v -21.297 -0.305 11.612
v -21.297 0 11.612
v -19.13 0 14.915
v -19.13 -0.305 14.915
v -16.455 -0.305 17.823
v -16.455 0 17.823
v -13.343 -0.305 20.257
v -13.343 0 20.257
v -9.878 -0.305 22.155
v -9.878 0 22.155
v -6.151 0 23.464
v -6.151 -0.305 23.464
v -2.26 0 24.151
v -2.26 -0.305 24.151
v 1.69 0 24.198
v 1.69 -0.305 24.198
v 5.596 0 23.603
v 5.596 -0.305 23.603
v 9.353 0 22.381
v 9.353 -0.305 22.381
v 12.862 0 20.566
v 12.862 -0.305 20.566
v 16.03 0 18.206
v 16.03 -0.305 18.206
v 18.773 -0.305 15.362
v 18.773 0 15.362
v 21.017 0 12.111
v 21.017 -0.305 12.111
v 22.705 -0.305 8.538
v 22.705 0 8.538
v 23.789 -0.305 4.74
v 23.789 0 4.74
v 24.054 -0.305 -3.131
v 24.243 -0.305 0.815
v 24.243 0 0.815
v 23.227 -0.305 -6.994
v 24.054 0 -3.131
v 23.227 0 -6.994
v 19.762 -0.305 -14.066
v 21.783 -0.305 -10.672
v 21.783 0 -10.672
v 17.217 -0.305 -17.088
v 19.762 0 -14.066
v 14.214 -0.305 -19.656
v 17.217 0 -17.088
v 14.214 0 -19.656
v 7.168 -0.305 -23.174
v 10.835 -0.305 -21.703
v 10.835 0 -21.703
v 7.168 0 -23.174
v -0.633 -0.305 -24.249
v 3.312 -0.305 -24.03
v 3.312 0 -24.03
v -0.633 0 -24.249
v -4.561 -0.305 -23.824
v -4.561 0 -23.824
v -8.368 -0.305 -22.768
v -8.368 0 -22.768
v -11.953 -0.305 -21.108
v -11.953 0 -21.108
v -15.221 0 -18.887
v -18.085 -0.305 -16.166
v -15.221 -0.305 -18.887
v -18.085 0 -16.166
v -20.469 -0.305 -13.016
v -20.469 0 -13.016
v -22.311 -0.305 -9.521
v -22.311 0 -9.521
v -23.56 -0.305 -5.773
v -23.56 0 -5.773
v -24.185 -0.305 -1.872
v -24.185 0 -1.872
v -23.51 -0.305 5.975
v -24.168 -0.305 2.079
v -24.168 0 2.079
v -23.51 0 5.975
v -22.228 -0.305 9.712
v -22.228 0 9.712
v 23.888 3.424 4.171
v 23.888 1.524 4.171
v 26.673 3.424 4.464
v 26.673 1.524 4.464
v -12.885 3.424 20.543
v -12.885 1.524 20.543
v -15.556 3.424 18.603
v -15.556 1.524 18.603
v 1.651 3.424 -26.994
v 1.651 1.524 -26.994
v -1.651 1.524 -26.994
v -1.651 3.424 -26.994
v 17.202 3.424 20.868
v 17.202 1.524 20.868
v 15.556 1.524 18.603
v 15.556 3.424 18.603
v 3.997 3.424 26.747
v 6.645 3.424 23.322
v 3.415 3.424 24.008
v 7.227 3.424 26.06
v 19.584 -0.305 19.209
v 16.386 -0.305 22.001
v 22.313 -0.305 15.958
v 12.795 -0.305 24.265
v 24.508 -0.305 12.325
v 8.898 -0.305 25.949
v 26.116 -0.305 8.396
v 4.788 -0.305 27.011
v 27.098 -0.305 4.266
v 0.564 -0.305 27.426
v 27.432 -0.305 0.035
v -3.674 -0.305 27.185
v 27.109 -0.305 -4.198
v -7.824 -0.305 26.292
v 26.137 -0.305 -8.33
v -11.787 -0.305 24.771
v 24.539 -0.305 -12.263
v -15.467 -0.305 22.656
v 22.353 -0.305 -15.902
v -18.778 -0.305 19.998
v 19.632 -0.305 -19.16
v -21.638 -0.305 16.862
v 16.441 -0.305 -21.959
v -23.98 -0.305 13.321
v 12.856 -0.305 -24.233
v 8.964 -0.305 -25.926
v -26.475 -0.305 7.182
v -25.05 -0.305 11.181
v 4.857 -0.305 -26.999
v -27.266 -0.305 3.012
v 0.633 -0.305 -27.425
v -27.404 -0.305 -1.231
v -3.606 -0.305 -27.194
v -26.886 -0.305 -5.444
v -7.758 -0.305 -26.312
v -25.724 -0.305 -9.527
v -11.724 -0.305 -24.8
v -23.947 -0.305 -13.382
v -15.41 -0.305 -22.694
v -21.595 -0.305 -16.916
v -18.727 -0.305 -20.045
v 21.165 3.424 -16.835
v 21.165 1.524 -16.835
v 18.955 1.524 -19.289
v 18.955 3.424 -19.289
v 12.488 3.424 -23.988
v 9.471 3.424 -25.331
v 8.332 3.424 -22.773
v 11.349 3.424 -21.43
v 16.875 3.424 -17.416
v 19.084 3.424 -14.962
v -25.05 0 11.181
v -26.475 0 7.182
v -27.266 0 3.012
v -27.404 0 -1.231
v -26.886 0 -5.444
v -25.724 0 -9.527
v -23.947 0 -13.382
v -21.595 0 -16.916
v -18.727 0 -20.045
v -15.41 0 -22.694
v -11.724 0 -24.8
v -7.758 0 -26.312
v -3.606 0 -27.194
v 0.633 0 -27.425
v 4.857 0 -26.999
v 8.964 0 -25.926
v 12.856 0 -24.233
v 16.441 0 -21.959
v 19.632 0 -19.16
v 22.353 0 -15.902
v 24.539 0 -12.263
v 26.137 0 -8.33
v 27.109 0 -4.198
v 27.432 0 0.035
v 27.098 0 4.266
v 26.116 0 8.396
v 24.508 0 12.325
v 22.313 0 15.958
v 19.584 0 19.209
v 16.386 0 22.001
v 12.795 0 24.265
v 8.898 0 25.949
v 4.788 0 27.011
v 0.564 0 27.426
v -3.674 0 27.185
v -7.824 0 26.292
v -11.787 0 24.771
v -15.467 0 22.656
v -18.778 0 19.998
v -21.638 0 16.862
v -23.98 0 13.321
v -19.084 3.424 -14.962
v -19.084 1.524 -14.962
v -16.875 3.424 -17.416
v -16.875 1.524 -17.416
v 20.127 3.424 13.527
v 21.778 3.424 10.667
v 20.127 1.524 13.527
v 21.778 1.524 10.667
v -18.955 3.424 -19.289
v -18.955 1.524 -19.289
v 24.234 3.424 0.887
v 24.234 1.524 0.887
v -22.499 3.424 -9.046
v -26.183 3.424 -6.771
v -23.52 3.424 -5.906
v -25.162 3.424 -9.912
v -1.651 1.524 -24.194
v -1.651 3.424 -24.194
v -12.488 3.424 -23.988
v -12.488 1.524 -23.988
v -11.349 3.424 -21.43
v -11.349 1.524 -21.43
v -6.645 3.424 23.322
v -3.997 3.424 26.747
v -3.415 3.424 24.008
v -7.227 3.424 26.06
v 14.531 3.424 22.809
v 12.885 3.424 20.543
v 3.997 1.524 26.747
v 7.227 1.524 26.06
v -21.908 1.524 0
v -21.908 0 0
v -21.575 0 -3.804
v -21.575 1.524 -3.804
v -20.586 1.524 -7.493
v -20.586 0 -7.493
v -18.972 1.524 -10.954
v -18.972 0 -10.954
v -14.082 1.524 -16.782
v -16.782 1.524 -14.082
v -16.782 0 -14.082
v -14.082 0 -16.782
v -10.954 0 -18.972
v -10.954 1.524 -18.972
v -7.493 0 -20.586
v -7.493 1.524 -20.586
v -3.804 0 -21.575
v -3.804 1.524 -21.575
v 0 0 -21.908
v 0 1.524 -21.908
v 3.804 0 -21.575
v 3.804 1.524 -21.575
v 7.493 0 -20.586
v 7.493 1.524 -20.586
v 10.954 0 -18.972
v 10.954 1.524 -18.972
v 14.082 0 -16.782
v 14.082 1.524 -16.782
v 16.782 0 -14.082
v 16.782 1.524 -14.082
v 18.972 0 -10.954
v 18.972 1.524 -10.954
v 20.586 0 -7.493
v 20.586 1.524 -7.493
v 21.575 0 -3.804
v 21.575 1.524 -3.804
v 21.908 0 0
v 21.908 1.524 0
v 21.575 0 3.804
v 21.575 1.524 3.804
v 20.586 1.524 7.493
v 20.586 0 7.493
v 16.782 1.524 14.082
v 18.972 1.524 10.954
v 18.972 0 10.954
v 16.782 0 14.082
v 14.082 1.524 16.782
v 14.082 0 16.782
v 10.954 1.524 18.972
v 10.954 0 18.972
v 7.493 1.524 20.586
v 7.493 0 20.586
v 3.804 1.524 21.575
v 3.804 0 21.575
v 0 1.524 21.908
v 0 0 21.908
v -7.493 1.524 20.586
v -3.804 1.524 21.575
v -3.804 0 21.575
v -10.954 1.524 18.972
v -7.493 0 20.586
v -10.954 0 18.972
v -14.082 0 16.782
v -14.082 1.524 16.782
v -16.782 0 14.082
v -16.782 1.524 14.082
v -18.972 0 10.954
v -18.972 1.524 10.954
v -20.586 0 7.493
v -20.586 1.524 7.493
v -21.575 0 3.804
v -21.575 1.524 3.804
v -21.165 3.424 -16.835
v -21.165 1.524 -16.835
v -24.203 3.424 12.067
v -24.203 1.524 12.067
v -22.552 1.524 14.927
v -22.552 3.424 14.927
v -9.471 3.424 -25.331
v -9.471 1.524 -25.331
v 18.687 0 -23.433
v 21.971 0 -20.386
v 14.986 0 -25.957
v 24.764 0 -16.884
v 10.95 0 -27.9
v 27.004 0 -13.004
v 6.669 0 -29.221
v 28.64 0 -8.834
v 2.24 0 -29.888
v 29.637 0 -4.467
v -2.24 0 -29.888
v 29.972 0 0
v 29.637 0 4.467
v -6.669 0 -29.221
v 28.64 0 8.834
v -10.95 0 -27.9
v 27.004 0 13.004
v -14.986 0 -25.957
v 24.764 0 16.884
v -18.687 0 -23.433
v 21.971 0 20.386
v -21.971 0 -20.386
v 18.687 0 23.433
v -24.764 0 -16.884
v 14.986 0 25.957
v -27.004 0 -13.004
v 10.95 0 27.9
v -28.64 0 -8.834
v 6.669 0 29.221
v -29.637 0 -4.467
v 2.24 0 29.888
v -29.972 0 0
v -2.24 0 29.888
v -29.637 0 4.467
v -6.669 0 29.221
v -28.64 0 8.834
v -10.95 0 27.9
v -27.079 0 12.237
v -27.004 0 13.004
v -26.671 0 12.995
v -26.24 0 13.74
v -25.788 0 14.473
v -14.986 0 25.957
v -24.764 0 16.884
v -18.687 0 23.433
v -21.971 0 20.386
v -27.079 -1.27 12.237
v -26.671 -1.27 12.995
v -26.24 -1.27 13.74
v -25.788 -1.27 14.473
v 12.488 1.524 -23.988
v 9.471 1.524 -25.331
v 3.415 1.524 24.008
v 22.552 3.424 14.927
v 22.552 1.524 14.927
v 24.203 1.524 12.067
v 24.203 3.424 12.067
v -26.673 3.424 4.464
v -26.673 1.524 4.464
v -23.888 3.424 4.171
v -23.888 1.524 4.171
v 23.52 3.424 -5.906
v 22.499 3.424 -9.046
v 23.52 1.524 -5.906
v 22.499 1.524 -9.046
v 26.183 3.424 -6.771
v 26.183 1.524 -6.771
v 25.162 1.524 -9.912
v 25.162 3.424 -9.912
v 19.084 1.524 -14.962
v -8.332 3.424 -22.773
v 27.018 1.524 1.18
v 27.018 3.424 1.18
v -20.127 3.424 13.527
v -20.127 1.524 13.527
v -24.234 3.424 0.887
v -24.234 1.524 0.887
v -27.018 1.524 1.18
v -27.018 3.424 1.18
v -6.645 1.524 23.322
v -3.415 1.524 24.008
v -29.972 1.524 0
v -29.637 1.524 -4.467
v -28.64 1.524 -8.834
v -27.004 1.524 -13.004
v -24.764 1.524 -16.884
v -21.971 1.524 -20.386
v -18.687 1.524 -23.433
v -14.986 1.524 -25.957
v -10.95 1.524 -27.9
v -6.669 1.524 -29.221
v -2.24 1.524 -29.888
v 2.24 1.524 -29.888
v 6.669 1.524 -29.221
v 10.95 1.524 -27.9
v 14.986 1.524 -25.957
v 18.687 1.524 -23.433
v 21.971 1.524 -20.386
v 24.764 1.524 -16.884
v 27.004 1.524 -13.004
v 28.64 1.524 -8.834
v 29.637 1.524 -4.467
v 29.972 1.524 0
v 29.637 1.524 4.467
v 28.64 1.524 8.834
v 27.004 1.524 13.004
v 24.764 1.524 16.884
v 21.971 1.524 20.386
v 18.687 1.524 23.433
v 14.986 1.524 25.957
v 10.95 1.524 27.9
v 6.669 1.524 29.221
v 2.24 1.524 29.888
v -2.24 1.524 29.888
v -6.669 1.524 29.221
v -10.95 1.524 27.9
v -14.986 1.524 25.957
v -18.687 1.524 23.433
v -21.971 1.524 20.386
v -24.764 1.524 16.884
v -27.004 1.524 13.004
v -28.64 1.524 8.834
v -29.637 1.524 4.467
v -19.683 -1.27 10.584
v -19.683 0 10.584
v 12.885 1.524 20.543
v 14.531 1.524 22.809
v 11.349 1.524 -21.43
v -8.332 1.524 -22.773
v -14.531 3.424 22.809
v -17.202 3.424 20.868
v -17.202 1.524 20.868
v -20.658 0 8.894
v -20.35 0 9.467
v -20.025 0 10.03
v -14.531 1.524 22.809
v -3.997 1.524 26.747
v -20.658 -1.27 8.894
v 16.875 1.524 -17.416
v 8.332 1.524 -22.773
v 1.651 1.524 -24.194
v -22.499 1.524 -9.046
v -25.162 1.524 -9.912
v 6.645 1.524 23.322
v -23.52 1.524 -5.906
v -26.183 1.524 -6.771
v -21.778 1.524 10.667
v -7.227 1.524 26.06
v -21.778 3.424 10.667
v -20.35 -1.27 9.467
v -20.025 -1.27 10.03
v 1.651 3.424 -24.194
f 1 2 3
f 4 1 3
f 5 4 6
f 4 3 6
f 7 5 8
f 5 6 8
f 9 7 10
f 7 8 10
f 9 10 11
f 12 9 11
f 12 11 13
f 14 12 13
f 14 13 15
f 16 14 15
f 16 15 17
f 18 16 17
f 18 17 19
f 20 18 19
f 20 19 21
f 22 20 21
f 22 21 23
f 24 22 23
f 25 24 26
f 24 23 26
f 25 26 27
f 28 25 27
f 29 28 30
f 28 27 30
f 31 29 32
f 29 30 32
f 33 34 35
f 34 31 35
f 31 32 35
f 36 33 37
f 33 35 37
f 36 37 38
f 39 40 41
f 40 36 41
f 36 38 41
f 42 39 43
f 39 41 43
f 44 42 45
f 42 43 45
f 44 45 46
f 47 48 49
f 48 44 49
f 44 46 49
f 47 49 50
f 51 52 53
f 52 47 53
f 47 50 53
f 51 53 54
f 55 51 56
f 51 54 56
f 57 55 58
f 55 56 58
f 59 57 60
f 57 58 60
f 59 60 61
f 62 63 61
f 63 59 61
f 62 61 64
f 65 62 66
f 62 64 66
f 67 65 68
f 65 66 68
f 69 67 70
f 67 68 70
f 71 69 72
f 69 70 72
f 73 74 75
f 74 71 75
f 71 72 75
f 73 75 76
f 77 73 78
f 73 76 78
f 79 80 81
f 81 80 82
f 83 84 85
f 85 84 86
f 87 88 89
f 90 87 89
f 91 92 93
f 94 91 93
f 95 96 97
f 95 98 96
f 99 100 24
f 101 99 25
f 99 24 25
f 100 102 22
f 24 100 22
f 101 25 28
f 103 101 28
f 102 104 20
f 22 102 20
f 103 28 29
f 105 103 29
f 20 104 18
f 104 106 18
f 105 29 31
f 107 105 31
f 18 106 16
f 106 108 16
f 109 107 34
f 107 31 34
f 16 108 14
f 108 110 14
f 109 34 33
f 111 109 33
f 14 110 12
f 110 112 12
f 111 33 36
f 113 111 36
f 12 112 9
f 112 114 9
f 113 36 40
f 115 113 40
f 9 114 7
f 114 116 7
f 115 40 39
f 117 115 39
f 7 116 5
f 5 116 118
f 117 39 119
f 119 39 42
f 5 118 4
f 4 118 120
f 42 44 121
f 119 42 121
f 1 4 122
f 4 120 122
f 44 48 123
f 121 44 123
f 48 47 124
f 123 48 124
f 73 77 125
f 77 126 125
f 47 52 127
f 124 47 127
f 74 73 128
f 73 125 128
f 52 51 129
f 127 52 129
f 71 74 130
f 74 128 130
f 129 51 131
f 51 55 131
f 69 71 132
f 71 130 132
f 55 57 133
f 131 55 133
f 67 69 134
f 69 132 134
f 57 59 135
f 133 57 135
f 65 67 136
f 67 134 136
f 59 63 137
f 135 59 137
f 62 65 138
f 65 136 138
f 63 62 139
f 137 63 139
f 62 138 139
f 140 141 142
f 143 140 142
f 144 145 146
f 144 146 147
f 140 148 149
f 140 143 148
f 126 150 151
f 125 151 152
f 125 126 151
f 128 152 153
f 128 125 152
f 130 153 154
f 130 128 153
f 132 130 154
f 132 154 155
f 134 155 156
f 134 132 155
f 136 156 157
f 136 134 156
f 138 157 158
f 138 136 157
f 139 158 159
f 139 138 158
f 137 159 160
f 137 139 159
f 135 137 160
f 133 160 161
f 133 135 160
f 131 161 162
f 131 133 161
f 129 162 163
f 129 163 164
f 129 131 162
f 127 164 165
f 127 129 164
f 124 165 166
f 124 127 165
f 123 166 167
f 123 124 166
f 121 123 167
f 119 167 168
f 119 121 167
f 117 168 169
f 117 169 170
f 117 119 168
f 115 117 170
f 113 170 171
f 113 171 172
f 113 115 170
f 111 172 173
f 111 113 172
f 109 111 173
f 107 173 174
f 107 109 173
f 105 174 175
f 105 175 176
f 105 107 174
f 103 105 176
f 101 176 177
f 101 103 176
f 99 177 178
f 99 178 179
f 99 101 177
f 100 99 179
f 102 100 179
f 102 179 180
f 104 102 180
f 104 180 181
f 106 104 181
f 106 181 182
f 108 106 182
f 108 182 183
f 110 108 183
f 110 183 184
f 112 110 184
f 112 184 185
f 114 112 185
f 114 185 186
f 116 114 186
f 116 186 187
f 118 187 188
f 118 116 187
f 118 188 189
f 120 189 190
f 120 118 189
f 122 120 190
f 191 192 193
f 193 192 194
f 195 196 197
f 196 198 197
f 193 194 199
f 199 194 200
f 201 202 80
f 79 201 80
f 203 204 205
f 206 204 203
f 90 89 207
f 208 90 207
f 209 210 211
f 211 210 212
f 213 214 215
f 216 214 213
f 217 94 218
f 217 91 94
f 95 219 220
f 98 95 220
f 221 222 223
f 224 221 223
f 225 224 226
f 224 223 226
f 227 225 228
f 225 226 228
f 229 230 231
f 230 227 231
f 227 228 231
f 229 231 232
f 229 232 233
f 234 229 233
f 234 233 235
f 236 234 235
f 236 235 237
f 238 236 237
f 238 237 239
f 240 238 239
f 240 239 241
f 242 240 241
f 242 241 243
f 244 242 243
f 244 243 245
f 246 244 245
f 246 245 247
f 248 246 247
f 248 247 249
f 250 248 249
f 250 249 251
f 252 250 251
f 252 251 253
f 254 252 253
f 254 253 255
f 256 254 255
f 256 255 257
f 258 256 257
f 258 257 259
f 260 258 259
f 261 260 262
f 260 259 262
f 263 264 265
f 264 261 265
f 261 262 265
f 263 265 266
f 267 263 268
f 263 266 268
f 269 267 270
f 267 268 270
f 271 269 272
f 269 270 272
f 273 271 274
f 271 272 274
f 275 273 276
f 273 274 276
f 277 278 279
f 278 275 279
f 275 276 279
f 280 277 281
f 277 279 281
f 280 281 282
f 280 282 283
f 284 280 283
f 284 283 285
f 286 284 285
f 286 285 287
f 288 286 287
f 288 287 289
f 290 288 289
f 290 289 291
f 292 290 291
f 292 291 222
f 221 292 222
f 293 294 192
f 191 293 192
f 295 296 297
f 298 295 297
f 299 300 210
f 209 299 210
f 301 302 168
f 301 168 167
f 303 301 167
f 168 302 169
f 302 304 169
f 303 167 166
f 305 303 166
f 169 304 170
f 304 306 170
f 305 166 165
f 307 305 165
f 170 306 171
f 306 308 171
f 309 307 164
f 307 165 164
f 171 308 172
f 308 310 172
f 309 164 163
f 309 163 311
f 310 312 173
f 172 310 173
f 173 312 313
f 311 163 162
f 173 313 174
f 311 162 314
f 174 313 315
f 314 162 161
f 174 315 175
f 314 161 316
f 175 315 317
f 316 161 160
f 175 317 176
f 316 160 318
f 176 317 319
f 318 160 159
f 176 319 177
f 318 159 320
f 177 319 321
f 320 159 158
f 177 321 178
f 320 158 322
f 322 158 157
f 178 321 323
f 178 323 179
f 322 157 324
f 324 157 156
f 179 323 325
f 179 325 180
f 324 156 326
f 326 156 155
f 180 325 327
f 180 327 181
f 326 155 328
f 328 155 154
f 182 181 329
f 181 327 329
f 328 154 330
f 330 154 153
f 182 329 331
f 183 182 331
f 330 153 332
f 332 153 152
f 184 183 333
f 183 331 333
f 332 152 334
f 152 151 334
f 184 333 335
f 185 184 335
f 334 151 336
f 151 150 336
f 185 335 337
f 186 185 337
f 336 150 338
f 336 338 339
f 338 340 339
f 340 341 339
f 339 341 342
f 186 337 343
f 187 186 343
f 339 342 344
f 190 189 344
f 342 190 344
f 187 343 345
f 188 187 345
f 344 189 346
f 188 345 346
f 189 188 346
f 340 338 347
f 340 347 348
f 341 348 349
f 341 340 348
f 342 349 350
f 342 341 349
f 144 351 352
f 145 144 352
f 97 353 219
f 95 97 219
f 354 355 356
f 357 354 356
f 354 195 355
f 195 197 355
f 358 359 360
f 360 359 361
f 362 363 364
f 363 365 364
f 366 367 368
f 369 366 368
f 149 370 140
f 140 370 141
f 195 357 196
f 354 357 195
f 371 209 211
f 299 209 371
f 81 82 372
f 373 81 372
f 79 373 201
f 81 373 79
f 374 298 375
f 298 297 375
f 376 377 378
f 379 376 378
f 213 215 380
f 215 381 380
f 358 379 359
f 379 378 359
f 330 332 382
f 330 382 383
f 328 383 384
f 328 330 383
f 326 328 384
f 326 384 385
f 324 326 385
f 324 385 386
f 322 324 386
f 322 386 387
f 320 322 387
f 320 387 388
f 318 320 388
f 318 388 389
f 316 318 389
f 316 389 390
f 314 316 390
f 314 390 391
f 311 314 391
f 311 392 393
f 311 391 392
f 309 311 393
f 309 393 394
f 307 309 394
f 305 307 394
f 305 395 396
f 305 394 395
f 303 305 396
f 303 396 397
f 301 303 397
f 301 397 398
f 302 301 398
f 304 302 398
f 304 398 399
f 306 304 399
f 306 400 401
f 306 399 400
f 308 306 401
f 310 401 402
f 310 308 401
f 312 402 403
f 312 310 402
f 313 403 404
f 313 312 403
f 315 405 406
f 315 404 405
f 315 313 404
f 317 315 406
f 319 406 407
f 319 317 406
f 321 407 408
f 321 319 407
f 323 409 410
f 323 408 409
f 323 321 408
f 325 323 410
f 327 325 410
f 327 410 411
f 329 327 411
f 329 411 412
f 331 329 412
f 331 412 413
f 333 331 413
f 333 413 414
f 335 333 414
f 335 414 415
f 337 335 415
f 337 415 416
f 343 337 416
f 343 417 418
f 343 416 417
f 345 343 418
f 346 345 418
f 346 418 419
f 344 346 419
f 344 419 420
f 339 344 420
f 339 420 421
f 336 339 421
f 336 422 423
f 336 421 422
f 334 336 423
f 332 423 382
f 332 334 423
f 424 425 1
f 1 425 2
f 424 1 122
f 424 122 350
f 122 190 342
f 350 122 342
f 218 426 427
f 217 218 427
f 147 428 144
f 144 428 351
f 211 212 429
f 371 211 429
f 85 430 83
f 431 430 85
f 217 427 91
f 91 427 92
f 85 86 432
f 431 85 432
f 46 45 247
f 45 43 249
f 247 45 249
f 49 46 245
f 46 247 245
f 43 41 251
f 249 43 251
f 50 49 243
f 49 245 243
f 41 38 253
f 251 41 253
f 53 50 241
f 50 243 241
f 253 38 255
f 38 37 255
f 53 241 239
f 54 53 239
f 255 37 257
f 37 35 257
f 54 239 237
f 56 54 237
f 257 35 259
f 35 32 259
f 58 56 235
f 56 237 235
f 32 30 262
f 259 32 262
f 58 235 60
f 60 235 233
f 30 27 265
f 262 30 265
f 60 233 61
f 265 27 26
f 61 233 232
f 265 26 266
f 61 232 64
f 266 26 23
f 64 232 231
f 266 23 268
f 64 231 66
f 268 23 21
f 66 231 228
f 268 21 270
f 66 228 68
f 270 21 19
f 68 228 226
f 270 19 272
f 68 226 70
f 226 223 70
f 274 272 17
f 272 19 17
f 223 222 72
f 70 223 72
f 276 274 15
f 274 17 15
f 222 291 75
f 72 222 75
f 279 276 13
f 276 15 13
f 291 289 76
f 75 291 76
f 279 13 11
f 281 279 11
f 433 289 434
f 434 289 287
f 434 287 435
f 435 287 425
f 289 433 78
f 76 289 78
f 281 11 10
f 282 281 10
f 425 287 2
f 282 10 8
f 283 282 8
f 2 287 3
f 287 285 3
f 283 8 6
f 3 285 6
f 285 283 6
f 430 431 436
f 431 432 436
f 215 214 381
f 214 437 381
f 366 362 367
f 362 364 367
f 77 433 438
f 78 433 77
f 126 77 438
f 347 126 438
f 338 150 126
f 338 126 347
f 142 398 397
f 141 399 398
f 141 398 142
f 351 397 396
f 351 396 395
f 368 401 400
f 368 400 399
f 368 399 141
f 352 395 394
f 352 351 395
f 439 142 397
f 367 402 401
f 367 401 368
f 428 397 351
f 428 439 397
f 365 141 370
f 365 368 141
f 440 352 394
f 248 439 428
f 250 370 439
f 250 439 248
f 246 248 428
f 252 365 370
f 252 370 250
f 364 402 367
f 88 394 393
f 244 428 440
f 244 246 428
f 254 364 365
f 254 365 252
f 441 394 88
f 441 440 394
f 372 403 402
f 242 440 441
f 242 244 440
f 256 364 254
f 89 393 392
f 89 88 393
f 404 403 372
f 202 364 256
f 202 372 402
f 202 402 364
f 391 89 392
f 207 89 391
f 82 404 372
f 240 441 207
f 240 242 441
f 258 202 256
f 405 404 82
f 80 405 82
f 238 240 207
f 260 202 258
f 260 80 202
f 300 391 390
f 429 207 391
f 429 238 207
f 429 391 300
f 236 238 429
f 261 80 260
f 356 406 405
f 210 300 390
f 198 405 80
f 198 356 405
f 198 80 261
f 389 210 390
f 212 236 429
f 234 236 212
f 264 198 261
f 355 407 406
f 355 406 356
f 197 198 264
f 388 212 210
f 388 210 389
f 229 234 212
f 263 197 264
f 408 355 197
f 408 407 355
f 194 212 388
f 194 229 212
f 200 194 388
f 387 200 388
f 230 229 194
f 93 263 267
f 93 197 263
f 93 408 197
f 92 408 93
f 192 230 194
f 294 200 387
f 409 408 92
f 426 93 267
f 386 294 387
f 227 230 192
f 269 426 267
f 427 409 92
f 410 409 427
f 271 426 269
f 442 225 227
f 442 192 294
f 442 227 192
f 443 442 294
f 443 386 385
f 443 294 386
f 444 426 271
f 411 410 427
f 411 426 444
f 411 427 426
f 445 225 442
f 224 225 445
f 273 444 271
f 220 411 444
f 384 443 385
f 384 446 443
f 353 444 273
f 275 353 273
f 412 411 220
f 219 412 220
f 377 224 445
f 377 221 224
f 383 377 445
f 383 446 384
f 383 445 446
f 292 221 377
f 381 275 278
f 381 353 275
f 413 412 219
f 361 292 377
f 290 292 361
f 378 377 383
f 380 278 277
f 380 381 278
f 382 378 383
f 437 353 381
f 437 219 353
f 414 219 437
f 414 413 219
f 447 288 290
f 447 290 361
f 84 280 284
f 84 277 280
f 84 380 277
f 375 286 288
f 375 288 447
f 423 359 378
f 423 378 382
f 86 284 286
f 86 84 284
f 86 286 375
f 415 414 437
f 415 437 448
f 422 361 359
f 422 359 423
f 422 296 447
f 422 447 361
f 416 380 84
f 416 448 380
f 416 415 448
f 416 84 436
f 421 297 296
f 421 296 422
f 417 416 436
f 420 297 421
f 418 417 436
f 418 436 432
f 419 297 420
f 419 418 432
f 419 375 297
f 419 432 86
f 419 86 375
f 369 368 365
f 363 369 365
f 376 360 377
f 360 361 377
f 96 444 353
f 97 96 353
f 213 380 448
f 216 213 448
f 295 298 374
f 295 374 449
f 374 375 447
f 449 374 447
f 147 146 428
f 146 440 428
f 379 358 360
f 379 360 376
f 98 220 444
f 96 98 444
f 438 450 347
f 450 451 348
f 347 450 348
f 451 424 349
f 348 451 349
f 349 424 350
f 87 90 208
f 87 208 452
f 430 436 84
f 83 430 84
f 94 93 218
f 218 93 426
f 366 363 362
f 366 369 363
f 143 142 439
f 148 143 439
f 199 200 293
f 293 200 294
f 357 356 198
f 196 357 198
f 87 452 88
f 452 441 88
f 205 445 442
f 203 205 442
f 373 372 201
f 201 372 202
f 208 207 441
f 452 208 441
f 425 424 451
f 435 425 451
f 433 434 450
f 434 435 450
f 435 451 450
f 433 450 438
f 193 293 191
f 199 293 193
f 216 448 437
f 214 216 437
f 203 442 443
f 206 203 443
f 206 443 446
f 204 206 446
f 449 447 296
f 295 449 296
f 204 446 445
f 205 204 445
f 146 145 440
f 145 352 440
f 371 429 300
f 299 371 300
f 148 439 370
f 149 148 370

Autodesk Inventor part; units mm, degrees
ref_plane "YZ Plane" through (0, 0, 0) normal (1, 0, 0) x (0, 1, 0)
ref_plane "XZ Plane" through (0, 0, 0) normal (0, 1, 0) x (-1, 0, 0)
ref_plane "XY Plane" through (0, 0, 0) normal (0, 0, 1) x (1, 0, 0)
sketch "Sketch1" plane through (0, 0, 0) normal (0, 1, 0) x (-1, 0, 0)
  circle A0 centre (0, 0) radius 21.9075
  circle A1 centre (0, 0) radius 29.972
  dimension "d0" = 59.944
  dimension "d1" = 43.815
extrude "Extrusion1" add sketch "Sketch1" along normal blind 1.524
sketch "Sketch2" plane through (0, 1.524, 0) normal (0, 1, 0) x (1, 0, 0)
  circle A0 centre (0, 0) radius 21.9075 projected
  line L0 (-1.651, 24.1935) -> (1.651, 24.1935)
  line L1 (1.651, 24.1935) -> (1.651, 26.9935)
  line L2 (1.651, 26.9935) -> (-1.651, 26.9935)
  line L3 (-1.651, 26.9935) -> (-1.651, 24.1935)
  line L4 (-1.651, 24.1935) -> (1.651, 26.9935) construction
  line L5 (1.651, 24.1935) -> (-1.651, 26.9935) construction
  circle A1 centre (0, 0) radius 29.972 projected
  point P0 (0, 25.5935)
  point P1 (0, 25.5935)
  dimension "d4" = 3.302
  dimension "d5" = 2.8
  dimension "d12" = 24.1935
extrude "Extrusion2" add sketch "Sketch2" along normal blind 1.9 contours L3 L2 L1 L0
pattern_circular "Circular Pattern1" count 15 over 360 about axis through (0, 0, 0) along (0, 1, 0) of "Extrusion2"
sketch "Sketch4" plane through (0, 0, 0) normal (1, 0, 0) x (0, 1, 0)
  line L0 (0, -27.432) -> (-0.3048, -27.432)
  line L1 (-0.3048, -27.432) -> (-0.3048, -24.257)
  line L2 (-0.3048, -24.257) -> (0, -24.257)
  line L3 (0, -24.257) -> (0, -27.432)
  line L4 (0, 29.972) -> (0, -29.972) projected
  line L5 (-1.0506, 0) -> (4.1698, 0) projected
  point P0 (0, 0)
  dimension "d21" = 3.175
  dimension "d22" = 0.3048
  dimension "d23" = 2.54
revolve "Revolution1" add sketch "Sketch4" angle 360 about axis through (0, -10, 0) along (0, 1, 0)
ref_plane "Work Plane1" through (-24.2026, 3.424, 12.0669) normal (-0.5, 0, -0.866) x (-0.866, 0, 0.5)
sketch "Sketch5" plane through (-24.2026, 3.424, 12.0669) normal (-0.5, 0, -0.866) x (-0.866, 0, 0.5)
  line L0 (-56.9655, -3.424) -> (2.9785, -3.424) projected
  line L1 (0.4385, -3.424) -> (-54.4255, -3.424) projected
  line L2 (2.6047, -3.424) -> (-4.6343, -3.424)
  line L3 (-4.6343, -3.424) -> (-4.6343, -4.694)
  line L4 (-4.6343, -4.694) -> (2.6047, -4.694)
  line L5 (2.6047, -4.694) -> (2.6047, -3.424)
  line L6 (-26.9935, -5.6328) -> (-26.9935, 0.9388) projected
  point P0 (-26.9935, -3.424)
  dimension "d25" = 1.27
  dimension "d26" = 0.3738
  dimension "d27" = 7.239
revolve "Revolution2" add sketch "Sketch5" angle 5 mid plane about axis through (-0.8255, -10, -1.4298) along (0, 1, 0)
properties part number "LEDRing"
